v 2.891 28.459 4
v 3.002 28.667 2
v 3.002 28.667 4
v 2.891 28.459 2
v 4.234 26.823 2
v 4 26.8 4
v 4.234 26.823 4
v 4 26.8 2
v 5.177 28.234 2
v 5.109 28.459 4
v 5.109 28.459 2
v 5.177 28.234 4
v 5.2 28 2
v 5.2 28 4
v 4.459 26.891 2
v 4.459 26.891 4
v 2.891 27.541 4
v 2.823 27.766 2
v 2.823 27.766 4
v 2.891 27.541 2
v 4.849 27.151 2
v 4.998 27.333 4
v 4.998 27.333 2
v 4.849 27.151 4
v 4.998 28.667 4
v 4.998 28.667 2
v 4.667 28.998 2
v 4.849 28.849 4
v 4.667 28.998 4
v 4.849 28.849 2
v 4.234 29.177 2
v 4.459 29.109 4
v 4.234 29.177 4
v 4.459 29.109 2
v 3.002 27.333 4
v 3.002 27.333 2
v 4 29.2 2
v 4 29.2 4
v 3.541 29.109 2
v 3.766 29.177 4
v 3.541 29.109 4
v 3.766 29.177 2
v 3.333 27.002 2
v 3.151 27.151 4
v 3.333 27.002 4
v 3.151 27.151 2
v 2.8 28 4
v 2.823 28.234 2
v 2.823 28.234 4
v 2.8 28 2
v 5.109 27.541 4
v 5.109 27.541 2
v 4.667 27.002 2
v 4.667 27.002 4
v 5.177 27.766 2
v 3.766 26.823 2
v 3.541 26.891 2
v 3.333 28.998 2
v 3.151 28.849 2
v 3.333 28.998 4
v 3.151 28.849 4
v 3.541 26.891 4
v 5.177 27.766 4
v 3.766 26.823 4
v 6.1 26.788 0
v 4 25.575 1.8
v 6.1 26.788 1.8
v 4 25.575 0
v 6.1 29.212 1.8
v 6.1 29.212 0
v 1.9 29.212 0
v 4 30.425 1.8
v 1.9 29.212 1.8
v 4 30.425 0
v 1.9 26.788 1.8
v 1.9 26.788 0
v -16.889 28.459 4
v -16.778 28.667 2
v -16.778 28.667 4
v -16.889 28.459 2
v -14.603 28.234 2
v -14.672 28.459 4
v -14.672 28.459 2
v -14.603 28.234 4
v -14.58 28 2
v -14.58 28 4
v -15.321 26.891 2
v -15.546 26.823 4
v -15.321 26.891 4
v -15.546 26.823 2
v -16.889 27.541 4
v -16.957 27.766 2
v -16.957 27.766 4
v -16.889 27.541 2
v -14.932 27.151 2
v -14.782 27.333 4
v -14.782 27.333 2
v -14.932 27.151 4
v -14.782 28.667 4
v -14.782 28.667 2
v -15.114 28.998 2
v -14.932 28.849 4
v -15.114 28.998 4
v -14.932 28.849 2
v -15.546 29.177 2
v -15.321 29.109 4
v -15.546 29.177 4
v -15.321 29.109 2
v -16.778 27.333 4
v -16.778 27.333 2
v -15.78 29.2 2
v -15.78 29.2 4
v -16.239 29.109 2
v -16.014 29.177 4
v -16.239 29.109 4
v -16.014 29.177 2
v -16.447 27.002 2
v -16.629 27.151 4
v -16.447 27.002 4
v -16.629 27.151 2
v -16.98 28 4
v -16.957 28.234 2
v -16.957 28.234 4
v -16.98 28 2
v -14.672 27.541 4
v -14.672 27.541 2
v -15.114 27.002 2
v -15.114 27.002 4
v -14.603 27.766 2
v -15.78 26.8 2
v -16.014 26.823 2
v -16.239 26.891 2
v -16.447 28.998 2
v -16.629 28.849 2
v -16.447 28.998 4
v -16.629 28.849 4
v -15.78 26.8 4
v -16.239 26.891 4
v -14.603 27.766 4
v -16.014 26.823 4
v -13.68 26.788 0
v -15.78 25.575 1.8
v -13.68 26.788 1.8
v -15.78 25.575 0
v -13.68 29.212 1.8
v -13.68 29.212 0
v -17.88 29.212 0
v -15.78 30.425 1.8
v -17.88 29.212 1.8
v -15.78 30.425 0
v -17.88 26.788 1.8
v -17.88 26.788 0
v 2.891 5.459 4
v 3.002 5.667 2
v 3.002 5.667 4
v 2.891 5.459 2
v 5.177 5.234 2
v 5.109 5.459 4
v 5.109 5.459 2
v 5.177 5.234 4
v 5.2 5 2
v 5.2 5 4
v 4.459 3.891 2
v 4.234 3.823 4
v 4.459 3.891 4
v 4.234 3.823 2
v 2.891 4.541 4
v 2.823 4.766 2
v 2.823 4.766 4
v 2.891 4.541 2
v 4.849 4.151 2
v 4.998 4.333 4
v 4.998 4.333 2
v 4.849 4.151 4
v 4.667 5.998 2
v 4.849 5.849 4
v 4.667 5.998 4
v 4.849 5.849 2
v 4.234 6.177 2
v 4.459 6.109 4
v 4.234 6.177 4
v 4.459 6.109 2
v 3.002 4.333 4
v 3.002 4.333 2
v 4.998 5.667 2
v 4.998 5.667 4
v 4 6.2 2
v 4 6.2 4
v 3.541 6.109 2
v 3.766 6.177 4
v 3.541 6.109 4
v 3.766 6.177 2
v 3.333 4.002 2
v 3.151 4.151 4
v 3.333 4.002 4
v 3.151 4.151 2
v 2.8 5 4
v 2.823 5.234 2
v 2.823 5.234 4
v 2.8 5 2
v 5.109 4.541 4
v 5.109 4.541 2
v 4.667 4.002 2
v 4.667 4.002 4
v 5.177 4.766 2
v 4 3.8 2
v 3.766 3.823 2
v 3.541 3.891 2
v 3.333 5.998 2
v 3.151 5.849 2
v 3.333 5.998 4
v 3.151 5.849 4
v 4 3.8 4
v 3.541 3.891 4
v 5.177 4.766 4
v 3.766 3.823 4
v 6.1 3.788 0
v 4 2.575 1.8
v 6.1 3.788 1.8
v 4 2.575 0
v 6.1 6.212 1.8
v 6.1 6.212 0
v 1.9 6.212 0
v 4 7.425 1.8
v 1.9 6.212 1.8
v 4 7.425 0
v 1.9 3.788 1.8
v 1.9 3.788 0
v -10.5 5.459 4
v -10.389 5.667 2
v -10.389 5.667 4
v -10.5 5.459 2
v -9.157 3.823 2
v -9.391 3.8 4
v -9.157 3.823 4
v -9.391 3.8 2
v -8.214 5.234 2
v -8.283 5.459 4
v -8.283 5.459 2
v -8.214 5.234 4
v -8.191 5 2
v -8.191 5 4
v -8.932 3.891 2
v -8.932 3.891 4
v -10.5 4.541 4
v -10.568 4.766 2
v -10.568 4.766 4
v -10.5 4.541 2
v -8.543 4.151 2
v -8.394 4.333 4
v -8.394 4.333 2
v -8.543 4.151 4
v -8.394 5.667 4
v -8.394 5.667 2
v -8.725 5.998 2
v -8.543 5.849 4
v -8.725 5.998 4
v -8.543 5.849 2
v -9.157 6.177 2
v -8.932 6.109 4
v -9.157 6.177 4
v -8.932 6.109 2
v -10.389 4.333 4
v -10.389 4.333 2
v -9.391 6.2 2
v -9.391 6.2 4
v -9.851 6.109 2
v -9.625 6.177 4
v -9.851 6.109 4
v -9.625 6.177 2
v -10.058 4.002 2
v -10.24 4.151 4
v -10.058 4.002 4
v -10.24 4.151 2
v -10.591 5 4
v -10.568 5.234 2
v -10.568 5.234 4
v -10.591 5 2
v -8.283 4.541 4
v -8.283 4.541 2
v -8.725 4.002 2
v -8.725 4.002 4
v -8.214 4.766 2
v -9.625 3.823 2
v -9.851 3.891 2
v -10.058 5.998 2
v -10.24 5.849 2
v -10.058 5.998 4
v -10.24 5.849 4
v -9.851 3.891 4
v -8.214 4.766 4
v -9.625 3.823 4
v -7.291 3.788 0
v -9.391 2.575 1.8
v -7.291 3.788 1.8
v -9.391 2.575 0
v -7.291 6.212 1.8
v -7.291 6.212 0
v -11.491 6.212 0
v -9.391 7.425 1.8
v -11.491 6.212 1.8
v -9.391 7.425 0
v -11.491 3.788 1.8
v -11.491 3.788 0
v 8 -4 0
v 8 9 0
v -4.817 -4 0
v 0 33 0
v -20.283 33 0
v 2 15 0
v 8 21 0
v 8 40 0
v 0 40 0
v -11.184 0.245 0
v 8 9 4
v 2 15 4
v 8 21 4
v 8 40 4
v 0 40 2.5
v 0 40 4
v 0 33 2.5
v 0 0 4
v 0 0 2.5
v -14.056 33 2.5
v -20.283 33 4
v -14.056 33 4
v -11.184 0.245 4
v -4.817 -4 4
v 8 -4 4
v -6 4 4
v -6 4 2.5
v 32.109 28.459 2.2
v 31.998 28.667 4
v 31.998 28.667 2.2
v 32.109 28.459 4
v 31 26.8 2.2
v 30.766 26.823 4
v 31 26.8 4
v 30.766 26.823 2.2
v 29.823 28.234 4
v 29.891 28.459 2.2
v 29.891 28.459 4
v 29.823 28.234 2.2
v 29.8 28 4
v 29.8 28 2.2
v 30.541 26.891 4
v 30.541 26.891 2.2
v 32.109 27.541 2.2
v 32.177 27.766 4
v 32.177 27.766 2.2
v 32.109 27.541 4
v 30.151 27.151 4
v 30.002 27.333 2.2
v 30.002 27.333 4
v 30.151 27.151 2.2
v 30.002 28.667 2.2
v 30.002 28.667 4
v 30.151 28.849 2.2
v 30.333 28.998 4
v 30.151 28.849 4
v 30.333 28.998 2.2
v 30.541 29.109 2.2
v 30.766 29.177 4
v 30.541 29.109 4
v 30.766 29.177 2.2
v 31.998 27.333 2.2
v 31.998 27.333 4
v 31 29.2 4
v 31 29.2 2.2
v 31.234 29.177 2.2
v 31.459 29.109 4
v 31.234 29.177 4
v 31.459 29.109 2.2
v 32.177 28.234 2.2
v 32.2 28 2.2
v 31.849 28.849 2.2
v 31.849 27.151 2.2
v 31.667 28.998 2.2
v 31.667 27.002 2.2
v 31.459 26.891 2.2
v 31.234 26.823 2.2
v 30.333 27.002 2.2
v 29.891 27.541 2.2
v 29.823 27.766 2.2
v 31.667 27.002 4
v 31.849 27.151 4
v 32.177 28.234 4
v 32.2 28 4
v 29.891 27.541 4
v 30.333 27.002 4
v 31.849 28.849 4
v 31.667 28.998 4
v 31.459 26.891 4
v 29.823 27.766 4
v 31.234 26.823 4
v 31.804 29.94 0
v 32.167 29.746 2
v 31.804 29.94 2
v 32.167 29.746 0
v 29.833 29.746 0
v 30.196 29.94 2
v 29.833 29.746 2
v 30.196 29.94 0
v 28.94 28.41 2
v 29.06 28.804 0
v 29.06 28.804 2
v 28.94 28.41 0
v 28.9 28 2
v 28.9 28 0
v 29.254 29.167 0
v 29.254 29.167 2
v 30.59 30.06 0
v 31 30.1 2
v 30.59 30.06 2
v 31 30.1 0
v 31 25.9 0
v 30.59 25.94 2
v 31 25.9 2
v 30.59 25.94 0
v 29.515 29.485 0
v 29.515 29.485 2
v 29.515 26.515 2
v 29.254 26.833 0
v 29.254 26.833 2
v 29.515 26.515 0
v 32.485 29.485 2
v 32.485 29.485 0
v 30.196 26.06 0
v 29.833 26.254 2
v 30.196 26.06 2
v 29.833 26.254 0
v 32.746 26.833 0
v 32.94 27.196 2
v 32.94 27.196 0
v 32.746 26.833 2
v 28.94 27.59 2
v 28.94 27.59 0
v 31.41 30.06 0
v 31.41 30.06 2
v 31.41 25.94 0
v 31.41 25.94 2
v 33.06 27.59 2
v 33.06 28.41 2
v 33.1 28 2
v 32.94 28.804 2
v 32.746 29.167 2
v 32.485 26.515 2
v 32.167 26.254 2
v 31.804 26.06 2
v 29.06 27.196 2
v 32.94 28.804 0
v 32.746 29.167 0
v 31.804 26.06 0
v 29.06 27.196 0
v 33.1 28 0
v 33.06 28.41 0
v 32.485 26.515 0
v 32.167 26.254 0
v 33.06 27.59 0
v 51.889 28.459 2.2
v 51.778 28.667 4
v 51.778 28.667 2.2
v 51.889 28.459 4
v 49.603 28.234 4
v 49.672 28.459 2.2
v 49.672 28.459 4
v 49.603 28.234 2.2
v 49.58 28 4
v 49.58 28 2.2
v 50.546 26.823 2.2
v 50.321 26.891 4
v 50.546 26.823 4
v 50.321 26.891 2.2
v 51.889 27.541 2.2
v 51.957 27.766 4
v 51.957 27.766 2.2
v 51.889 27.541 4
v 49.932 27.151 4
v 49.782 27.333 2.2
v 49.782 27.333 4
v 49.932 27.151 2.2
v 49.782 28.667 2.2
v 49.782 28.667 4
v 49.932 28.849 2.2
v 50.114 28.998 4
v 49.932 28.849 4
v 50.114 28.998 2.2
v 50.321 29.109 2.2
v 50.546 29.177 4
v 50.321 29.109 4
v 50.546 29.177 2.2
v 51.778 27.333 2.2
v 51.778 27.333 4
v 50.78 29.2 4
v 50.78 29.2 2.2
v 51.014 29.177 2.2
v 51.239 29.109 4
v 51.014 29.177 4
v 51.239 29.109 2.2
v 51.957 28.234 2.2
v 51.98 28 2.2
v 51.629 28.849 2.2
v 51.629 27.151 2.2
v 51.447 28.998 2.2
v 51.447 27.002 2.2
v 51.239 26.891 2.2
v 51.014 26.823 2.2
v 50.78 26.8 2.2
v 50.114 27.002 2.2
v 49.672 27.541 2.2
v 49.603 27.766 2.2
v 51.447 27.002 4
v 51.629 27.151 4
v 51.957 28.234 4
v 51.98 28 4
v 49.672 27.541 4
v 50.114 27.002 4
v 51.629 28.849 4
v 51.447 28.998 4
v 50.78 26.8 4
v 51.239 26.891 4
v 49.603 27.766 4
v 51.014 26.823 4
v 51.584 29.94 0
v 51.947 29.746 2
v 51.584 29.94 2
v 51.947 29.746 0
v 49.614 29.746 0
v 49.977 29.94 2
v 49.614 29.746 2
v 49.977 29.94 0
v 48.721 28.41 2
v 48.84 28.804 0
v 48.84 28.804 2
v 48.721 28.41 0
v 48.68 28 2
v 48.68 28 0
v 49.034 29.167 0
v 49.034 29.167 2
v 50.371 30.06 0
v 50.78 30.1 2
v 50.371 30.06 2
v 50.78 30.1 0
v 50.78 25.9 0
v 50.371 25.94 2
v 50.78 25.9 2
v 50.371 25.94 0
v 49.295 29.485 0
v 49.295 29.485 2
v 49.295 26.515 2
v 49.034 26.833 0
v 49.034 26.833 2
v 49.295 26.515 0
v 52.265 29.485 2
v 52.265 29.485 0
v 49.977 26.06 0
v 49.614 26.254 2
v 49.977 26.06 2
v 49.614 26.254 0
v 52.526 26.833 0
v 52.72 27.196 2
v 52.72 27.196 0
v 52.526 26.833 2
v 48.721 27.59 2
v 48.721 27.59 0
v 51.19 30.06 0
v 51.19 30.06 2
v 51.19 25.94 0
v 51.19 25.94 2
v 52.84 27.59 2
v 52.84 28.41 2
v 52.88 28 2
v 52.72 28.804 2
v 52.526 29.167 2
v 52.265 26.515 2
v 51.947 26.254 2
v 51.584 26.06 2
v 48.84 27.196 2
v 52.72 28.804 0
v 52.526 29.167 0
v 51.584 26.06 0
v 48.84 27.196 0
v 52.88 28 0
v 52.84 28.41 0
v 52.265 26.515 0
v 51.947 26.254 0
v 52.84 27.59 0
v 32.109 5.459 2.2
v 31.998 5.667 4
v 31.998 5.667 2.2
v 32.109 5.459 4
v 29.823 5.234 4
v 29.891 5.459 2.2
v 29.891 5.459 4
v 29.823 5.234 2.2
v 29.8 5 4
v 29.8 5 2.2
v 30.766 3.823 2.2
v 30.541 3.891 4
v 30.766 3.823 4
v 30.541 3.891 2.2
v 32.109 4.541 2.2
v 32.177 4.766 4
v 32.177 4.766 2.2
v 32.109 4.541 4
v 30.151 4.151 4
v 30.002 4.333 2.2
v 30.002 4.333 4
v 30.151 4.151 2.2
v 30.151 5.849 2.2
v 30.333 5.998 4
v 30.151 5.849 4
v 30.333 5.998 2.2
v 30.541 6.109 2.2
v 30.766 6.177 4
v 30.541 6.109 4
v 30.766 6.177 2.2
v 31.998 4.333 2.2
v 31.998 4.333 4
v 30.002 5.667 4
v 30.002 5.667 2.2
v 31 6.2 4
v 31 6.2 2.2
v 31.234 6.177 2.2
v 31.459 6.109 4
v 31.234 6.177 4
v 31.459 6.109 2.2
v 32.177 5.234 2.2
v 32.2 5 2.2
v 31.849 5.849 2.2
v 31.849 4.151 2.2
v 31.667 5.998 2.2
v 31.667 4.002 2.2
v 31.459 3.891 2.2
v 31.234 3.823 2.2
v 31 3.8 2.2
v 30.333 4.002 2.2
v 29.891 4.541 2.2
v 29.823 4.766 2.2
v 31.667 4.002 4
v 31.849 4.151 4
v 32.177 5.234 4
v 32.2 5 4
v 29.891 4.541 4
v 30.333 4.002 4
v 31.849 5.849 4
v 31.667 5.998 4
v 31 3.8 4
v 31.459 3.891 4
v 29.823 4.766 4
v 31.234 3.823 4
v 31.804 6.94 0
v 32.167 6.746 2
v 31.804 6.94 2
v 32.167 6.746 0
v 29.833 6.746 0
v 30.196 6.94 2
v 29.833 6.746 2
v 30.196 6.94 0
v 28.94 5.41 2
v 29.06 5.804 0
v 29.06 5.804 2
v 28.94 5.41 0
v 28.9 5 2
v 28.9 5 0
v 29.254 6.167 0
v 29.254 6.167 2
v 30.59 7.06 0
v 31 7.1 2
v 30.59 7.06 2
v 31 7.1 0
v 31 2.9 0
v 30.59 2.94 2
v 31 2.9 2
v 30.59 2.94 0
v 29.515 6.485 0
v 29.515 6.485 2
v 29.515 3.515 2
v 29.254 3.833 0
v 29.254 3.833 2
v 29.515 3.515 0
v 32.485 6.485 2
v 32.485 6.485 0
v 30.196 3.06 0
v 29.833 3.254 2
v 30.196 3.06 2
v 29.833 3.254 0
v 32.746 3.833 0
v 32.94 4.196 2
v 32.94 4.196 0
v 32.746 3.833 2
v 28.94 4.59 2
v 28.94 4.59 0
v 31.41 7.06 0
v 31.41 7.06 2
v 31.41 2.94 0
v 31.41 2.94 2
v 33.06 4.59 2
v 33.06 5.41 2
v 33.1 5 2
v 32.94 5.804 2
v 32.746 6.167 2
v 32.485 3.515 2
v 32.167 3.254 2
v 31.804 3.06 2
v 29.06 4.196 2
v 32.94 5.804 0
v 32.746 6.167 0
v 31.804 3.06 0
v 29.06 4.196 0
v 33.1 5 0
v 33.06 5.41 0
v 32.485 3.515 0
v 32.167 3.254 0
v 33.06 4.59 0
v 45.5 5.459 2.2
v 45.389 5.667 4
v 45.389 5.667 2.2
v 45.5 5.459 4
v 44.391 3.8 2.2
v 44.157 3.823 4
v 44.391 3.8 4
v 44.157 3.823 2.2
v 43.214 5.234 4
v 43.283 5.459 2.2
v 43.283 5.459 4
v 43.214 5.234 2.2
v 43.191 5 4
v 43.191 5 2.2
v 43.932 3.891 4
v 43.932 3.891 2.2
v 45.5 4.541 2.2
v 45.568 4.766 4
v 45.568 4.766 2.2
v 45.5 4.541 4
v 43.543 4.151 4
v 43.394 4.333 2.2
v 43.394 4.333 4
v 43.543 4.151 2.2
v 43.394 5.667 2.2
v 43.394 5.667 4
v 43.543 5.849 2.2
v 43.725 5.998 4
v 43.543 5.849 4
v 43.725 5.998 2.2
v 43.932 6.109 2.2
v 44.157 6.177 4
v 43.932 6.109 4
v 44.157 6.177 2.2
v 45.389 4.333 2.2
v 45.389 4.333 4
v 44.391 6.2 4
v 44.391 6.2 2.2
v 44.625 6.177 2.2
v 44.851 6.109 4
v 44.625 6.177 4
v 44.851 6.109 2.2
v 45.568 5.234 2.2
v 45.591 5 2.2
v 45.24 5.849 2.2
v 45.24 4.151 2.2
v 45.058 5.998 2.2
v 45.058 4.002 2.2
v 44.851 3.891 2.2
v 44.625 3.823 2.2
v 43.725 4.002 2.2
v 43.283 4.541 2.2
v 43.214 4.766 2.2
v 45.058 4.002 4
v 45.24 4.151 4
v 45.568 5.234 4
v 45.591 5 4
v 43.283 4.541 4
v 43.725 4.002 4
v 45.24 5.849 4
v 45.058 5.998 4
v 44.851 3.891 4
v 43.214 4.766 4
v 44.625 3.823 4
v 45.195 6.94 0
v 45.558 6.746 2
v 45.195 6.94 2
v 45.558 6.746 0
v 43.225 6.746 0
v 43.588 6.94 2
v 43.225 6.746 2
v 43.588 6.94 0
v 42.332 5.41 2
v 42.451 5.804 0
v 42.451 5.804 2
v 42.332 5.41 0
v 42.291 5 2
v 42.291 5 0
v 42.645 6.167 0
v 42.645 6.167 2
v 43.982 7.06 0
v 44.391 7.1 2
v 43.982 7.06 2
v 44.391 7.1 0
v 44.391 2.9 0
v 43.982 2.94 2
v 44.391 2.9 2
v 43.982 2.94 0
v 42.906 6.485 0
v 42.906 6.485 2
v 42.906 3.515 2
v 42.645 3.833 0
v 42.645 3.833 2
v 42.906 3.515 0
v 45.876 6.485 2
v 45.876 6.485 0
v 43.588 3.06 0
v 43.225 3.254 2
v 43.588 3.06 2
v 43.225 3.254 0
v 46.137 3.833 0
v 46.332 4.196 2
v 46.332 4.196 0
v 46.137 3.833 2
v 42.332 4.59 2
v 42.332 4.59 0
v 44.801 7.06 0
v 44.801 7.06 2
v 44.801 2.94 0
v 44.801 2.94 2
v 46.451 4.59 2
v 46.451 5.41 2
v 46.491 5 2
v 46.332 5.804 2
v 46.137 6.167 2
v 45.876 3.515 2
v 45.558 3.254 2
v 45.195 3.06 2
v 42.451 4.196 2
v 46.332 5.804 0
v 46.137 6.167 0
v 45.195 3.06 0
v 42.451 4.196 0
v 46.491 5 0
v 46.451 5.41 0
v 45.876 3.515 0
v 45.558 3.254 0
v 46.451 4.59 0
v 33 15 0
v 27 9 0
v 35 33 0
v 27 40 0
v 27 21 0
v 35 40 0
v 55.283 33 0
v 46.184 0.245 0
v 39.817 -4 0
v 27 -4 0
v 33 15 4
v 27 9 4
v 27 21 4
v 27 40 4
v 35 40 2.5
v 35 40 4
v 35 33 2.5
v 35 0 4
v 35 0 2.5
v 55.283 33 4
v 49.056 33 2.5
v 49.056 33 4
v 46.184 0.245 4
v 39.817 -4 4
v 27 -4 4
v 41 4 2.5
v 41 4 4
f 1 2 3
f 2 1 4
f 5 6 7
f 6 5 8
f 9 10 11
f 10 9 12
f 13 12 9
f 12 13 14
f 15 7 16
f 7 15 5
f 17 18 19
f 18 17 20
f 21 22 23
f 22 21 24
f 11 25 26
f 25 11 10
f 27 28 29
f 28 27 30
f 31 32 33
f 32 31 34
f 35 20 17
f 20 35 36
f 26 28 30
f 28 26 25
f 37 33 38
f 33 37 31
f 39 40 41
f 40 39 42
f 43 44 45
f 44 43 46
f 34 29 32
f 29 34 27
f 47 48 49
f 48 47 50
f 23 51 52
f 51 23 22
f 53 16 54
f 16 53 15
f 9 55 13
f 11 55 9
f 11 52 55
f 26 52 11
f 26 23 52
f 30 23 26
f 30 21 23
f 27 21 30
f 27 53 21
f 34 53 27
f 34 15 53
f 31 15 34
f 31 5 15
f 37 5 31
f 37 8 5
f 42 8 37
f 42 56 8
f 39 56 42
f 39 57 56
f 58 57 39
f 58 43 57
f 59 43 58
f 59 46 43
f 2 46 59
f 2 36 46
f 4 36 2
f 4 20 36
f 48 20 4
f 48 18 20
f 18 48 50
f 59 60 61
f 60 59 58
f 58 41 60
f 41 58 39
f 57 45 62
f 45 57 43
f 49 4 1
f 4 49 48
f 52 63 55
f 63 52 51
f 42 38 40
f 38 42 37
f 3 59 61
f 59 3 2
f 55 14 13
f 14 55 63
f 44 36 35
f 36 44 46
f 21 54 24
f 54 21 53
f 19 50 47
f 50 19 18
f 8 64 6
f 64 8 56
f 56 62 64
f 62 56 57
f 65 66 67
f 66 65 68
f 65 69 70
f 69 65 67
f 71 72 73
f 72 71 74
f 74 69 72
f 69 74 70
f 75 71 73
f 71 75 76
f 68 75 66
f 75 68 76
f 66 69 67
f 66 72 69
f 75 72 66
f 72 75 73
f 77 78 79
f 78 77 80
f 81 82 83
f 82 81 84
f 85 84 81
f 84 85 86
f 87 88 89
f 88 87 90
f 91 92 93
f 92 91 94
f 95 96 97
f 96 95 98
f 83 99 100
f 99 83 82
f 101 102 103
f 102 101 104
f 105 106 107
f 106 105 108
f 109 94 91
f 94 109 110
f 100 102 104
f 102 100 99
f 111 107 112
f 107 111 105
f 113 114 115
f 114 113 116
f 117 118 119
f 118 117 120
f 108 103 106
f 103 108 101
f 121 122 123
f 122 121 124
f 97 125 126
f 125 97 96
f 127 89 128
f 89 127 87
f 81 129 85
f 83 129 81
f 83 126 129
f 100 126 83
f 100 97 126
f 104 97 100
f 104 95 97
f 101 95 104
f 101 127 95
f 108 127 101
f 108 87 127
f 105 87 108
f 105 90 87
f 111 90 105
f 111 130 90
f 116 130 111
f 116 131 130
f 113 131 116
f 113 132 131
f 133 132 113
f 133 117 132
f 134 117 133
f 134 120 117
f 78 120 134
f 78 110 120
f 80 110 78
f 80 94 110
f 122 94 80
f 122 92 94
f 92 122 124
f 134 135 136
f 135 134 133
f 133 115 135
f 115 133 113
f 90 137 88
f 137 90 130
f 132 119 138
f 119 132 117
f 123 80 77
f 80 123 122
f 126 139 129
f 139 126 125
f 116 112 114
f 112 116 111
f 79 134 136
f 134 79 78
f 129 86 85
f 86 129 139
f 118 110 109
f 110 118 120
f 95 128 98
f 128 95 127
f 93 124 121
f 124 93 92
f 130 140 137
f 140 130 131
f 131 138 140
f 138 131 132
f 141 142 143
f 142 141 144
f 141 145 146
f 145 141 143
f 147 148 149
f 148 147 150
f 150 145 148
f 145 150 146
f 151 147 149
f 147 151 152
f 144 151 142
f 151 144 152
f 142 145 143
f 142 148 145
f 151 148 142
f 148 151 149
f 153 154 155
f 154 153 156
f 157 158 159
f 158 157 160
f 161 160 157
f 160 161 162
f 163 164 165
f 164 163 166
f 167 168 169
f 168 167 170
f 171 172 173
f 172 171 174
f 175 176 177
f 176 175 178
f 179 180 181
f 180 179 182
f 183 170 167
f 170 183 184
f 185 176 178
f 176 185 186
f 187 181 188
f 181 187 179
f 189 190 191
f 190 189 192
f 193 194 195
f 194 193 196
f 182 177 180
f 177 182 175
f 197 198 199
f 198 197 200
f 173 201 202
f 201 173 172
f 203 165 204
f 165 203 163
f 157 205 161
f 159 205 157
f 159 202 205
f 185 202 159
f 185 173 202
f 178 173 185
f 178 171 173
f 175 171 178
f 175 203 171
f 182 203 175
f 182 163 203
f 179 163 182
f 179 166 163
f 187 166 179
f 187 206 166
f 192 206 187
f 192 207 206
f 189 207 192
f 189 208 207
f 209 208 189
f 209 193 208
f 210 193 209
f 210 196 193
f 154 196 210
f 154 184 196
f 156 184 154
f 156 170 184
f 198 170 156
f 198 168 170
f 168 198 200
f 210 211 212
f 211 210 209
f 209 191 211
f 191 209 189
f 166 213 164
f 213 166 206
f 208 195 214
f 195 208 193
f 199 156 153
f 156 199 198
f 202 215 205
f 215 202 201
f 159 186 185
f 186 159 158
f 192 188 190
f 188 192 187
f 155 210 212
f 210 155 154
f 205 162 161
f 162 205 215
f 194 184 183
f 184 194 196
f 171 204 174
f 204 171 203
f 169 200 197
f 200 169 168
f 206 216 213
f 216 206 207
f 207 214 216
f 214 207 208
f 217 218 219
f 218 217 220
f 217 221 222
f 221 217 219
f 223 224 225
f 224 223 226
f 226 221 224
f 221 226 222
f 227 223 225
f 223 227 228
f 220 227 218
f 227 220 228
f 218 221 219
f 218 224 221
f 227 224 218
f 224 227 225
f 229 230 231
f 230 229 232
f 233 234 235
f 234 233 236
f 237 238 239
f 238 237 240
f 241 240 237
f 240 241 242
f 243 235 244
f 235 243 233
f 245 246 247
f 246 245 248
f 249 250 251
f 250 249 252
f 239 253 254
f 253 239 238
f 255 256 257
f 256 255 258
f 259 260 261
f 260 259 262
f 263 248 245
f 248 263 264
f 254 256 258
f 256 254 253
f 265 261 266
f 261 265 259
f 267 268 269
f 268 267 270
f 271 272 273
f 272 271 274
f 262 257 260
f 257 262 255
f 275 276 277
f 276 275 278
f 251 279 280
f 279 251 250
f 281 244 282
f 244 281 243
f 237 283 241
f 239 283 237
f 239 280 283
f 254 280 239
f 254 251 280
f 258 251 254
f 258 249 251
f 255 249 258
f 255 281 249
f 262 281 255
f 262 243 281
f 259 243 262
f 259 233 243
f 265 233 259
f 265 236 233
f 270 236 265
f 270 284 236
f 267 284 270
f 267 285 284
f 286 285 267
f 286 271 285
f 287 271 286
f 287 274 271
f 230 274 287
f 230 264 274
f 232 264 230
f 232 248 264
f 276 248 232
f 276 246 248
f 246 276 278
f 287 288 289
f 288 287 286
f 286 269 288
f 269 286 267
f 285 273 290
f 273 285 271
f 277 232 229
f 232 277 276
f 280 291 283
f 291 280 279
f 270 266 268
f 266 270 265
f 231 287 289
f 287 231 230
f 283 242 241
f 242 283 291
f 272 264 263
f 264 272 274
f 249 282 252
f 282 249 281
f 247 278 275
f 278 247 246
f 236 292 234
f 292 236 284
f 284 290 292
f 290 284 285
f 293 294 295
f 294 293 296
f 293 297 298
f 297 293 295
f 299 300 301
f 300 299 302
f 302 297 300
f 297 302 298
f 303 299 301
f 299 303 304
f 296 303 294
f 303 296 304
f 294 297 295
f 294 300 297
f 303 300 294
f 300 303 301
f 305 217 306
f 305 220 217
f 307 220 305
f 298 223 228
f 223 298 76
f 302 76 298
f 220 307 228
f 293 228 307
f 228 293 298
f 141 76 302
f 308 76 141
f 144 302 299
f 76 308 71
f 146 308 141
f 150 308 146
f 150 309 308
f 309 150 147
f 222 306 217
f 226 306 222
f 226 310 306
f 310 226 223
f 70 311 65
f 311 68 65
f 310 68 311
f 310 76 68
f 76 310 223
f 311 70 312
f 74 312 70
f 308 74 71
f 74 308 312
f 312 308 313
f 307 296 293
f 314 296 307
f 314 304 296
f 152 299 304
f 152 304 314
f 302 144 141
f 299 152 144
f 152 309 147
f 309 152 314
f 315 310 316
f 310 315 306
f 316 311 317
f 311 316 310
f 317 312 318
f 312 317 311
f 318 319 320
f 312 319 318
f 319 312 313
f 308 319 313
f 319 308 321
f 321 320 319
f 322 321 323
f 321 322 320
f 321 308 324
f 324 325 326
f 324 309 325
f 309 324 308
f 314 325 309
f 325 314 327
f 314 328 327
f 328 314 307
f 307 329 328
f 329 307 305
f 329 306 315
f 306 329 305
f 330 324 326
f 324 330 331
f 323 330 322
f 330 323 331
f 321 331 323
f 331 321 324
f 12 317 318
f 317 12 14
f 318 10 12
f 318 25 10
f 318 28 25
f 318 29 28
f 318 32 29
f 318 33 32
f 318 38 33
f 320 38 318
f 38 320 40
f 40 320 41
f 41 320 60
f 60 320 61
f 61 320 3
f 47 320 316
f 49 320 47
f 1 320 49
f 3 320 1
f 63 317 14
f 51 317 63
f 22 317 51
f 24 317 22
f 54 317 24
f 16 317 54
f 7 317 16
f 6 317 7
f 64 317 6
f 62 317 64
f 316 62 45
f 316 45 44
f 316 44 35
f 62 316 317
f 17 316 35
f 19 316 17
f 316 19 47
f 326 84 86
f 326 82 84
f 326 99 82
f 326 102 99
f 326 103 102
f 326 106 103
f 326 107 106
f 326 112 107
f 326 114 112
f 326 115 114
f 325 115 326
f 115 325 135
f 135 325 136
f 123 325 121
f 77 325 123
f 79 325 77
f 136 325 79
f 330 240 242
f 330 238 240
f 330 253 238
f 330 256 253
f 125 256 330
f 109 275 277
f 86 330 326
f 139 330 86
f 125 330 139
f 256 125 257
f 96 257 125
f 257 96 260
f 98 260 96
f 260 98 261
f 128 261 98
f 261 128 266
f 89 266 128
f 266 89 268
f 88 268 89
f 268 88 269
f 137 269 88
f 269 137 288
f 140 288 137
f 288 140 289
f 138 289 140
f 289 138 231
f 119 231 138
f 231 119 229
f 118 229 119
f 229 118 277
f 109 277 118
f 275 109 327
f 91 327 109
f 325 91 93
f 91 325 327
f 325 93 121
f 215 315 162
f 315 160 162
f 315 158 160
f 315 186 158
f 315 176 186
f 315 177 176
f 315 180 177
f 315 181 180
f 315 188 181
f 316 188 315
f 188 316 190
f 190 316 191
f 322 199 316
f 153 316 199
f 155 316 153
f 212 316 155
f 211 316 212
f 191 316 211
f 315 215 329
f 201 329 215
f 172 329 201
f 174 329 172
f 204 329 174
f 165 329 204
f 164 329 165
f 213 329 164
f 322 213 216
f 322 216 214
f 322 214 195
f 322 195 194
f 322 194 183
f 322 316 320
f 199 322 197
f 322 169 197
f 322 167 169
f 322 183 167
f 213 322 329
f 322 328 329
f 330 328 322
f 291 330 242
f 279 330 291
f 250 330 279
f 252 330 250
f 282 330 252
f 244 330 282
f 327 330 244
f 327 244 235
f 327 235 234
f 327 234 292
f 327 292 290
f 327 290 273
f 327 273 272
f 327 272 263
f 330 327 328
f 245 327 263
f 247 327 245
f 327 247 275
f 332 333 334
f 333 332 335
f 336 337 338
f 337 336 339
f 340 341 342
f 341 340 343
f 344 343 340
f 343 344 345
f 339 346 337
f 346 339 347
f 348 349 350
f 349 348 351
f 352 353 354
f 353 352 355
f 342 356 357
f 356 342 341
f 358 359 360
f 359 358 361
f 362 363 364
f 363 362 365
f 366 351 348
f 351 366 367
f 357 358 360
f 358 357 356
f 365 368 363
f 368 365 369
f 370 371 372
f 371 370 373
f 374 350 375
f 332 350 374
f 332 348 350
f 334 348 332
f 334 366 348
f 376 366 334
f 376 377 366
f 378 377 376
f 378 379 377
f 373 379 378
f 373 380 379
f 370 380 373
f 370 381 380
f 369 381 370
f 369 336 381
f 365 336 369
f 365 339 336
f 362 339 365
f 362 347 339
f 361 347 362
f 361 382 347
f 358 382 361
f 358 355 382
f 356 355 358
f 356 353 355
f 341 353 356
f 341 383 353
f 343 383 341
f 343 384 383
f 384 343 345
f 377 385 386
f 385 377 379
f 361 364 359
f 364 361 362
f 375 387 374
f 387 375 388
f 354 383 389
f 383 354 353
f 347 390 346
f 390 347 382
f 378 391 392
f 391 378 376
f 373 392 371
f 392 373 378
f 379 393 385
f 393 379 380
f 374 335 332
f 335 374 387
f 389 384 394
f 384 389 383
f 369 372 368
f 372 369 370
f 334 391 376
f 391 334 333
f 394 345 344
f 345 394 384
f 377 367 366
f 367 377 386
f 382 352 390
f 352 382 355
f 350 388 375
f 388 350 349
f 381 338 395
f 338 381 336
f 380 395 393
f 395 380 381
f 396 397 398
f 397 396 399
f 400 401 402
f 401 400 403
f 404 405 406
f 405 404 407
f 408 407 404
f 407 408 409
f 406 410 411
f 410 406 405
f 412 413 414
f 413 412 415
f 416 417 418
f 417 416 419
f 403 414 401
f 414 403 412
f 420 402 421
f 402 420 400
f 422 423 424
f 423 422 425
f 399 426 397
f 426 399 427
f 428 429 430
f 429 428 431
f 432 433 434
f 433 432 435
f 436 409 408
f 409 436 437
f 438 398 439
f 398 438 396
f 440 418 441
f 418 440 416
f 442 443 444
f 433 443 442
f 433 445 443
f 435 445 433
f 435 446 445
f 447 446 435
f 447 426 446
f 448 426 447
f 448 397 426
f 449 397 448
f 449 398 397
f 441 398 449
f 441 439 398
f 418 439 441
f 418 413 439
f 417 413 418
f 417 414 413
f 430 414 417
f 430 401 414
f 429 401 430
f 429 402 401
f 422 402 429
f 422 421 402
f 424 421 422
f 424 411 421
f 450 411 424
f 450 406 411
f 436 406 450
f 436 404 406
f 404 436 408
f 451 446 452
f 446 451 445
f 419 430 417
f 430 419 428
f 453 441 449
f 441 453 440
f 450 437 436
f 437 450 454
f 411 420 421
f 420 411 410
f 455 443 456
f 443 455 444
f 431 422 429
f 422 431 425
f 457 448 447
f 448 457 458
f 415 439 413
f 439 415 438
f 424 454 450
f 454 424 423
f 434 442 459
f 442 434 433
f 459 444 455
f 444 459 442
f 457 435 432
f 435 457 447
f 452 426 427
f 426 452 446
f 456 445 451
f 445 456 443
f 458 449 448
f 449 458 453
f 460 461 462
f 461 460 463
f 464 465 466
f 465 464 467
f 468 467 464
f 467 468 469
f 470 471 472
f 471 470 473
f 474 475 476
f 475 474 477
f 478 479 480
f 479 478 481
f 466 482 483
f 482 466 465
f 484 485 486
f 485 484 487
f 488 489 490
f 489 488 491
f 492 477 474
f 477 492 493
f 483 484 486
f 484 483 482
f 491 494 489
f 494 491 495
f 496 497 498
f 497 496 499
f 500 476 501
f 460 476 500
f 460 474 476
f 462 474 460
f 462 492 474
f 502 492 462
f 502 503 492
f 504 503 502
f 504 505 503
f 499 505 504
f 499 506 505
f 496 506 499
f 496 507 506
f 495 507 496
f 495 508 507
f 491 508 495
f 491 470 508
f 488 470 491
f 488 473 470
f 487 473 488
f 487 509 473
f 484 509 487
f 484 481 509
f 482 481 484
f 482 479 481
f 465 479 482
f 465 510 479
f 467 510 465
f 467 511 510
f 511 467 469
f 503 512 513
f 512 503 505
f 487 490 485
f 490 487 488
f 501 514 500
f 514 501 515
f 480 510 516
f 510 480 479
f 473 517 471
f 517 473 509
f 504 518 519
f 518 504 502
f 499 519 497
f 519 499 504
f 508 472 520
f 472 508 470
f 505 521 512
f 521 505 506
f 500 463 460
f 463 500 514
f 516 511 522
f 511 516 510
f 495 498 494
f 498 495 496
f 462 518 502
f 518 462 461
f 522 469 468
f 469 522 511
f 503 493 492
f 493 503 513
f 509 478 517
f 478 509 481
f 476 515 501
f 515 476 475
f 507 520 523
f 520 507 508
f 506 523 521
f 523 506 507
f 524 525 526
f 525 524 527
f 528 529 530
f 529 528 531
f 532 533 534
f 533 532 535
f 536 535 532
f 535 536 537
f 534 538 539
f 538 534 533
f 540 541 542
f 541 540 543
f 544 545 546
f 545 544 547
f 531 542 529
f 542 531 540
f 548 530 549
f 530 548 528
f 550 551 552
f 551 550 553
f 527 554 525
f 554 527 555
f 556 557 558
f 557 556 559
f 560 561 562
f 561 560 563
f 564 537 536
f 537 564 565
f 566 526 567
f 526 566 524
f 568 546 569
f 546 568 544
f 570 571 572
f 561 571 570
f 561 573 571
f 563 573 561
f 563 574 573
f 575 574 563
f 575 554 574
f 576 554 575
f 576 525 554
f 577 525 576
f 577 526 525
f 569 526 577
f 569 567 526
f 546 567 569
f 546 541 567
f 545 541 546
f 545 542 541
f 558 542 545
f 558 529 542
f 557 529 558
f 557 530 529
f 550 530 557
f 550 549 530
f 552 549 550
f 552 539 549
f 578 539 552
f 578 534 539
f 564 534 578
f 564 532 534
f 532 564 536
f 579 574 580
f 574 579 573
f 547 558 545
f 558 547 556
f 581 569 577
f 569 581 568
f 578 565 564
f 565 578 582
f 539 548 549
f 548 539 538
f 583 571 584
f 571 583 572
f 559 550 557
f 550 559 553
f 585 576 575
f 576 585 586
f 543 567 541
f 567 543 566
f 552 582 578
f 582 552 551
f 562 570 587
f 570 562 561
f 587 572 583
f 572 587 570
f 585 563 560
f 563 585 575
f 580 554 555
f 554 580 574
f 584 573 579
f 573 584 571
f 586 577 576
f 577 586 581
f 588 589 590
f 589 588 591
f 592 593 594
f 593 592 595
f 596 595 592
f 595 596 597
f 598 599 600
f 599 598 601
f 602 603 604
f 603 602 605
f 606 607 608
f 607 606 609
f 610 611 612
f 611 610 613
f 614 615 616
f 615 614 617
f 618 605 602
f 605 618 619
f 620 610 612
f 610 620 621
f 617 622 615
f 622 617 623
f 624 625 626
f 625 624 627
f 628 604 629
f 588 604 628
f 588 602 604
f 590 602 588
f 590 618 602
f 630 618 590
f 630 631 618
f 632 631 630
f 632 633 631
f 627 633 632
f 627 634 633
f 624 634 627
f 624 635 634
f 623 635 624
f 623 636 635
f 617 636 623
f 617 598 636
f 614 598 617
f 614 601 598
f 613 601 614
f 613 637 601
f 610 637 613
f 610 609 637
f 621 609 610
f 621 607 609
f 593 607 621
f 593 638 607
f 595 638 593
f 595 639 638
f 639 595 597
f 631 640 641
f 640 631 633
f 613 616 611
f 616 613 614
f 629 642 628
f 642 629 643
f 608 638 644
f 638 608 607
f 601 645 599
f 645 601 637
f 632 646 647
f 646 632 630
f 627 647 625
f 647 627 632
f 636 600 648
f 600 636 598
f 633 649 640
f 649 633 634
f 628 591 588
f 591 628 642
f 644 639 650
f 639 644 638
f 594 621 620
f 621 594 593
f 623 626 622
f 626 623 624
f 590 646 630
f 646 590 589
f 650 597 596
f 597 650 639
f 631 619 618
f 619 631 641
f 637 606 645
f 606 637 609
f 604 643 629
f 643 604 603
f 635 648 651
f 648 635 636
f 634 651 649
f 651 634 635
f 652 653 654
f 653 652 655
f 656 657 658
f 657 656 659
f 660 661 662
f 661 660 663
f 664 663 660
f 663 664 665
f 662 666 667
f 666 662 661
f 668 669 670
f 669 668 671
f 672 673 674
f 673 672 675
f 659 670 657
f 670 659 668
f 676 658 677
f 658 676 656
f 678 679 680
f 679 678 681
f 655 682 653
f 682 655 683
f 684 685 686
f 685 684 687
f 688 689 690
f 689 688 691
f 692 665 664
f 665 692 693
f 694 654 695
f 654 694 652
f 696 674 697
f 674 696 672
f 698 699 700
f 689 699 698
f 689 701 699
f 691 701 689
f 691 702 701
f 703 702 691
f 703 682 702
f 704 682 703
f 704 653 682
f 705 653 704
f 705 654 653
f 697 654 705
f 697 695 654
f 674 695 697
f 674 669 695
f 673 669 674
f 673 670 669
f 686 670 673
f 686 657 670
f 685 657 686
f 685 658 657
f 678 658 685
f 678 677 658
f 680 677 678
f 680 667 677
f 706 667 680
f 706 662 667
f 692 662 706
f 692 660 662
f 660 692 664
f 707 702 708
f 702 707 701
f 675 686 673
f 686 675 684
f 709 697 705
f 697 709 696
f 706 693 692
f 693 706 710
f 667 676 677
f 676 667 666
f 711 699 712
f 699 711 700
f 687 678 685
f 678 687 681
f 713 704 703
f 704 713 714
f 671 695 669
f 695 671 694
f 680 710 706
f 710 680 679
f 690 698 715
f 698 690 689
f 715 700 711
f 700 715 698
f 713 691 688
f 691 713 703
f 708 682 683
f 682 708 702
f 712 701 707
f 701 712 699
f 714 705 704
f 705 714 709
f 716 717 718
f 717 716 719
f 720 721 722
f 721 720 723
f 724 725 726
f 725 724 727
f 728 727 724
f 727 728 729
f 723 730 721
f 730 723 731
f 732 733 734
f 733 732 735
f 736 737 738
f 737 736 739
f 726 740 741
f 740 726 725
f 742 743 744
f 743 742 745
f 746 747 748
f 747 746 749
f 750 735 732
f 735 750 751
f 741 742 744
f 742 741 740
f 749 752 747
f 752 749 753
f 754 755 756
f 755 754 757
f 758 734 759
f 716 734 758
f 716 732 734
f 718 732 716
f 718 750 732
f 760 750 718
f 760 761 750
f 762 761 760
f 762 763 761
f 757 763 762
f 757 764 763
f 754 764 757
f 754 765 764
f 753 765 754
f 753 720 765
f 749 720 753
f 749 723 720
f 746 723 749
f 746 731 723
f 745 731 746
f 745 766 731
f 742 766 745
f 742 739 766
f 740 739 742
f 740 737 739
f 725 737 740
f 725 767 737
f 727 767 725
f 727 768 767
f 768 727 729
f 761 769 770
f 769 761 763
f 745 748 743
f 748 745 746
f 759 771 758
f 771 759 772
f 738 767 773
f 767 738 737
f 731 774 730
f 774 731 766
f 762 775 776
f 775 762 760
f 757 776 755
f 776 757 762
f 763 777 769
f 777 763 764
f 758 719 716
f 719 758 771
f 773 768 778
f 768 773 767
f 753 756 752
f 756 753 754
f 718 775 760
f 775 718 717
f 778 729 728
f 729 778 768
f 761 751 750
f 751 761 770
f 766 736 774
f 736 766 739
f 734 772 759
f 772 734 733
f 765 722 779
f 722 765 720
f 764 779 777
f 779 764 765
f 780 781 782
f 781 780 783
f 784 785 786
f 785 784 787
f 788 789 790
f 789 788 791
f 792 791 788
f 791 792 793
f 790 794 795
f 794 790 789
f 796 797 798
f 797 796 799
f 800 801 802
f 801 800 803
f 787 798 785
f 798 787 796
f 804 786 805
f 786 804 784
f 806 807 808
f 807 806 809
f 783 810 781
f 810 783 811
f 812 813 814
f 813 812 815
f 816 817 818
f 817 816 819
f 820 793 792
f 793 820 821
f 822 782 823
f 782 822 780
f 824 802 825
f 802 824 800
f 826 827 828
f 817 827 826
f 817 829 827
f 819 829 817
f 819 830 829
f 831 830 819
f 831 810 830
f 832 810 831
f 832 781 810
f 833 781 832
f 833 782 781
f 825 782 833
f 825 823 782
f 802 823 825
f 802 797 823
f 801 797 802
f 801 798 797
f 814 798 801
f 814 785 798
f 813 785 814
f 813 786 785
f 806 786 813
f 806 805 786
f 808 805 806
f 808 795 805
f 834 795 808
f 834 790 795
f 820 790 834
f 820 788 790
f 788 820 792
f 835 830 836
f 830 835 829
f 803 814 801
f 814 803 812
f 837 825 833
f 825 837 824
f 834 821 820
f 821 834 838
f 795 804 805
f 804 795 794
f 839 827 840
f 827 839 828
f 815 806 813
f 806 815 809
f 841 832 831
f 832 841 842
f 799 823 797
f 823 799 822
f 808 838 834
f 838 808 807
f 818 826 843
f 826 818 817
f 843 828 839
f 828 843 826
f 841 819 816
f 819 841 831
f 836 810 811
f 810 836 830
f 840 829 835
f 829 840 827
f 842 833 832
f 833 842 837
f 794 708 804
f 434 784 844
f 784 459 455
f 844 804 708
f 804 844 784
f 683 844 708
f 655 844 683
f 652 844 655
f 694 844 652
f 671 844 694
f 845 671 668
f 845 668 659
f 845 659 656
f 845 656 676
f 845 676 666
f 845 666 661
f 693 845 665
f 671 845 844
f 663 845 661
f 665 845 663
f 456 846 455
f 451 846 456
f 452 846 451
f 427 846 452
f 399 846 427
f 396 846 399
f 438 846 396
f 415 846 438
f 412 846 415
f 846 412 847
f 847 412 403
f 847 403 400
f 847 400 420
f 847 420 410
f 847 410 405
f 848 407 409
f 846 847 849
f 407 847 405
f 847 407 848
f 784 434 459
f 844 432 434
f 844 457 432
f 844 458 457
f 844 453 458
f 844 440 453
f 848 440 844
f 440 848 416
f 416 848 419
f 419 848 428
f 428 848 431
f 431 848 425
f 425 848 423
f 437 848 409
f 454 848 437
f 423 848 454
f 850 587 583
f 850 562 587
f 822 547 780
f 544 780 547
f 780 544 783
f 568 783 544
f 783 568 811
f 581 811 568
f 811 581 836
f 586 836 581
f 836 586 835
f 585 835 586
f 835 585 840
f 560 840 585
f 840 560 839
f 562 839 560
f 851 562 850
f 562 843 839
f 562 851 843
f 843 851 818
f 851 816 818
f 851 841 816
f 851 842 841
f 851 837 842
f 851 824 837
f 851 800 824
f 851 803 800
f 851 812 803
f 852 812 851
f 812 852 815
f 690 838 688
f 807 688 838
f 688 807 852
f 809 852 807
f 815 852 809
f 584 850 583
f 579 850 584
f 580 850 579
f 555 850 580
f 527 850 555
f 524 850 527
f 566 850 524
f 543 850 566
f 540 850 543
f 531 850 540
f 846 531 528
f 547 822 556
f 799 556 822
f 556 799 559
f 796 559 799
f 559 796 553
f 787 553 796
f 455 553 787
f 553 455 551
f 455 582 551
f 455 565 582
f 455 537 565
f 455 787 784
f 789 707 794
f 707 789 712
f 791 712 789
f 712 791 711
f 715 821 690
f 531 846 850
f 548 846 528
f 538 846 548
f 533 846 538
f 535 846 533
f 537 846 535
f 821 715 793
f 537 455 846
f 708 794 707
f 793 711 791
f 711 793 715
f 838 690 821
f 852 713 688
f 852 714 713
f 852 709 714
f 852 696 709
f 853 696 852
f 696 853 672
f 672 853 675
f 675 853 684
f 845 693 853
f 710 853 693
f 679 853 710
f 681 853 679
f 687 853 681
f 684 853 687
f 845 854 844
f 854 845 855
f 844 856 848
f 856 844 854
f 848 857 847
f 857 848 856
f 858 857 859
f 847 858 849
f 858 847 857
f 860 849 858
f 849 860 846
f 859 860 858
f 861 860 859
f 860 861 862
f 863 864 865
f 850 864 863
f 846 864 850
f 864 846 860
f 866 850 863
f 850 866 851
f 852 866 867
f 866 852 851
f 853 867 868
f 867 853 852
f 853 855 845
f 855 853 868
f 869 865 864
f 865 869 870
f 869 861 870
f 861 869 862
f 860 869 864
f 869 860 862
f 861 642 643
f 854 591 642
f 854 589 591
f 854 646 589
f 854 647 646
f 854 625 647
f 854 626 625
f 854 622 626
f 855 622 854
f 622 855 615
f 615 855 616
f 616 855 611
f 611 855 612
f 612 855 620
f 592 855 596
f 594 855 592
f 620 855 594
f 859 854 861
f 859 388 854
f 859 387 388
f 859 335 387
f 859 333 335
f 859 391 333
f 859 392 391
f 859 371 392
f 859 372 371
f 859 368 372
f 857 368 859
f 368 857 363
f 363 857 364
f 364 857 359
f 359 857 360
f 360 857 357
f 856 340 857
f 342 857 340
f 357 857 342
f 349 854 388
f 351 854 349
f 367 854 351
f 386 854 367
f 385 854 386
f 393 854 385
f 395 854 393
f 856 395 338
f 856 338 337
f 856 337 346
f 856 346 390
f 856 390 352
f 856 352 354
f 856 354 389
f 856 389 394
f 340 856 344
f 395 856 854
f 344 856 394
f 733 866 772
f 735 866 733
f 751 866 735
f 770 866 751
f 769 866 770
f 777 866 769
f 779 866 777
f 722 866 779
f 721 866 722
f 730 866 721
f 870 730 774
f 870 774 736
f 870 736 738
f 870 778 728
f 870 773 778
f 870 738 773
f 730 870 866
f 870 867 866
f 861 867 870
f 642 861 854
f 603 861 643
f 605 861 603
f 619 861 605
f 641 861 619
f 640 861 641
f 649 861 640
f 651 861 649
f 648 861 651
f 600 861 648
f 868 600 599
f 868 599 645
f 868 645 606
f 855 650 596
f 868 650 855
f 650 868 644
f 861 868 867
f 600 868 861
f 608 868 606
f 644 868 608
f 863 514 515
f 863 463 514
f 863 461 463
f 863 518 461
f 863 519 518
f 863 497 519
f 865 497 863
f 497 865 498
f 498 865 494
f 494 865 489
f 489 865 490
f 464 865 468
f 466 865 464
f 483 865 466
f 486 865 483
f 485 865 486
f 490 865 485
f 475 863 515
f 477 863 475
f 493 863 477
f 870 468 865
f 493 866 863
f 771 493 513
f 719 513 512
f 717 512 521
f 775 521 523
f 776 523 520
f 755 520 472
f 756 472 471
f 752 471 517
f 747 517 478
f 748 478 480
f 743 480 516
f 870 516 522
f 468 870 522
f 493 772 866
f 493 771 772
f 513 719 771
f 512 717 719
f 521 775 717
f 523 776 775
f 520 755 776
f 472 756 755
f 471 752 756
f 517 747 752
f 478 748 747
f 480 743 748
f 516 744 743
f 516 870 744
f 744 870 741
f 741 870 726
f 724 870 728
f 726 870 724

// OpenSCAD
/*
 * Parametric OpenSCAD design for a caliper notched jaw cover.
 * Version: v0.07
 * Designed to exactly match the provided sketch:
 * - Straight measuring face with a V-notch
 * - Slanted outer face
 * - Top extension tab for alignment
 * - Slanted bottom tip
 */

/* [Version] */
version = "0.07";

/* [General Settings] */
// Which part to generate, laid flat for 3D printing
part = "split_halves"; // [left_fixed, right_sliding, both, cutaway, split_halves]

/* [Caliper Metal Jaw Dimensions] */
// Total length of the metal jaw to cover (including the tab area)
jaw_length = 40.0;
// Thickness of the metal jaw
jaw_thickness = 3.0;
// Width of the metal jaw at the base (top, where it meets the caliper body)
jaw_base_width = 16.0;
// Width of the metal jaw where the main outer slant begins (X offset at the cutback)
jaw_tip_slant_width = 6.0;
// Distance from the tip (Y=0) where the main outer slant begins (Y offset of the cutback)
jaw_tip_slant_height = 4.0;

/* [Cover Dimensions] */
// Total thickness of the printed cover
cover_total_thickness = 8.0;
// Thickness of the plastic on the measuring (straight) face
wall_measuring_face = 8.0;
// Thickness of the plastic on the outer (slanted) faces (perpendicular thickness)
wall_outer_face = 6.0;
// Thickness of the plastic at the bottom tip
wall_tip = 4.0;

/* [Tab and Cutout Dimensions] */
// Length of the cutout at the top to clear the caliper body (makes the tab)
cutout_length = 7.0;

/* [Notch Dimensions] */
// Distance from the inner metal jaw tip to the center of the V-notch
notch_distance_from_tip = 15.0;
// Total vertical height of the V-notch opening
notch_height = 12.0;
// Depth of the V-notch into the plastic
notch_depth = 6.0;

/* [Bolt Holes] */
// Add optional M2 bolt holes to clamp the cover
enable_bolt_holes = true;
// Y position (height) of the top bolt holes
bolt_hole_top_y = 28.0;
// Y position (height) of the bottom bolt holes
bolt_hole_bottom_y = 5.0;
// Diameter of the M2 bolt shaft clearance hole
m2_hole_dia = 2.4;
// Flat-to-flat width of the M2 nut (4.0mm standard + 0.2mm clearance)
m2_nut_flat_to_flat = 4.2;
// Depth of the M2 nut recession
m2_nut_depth = 1.8;
// Diameter of the M2 bolt head recession
m2_head_dia = 4.2;
// Depth of the M2 bolt head recession
m2_head_depth = 2.0;
// Thickness of the sacrificial bridge layer to support the nut recession overhang (typically 1 layer height)
bridge_layer_thickness = 0.2;

// --- Implementation ---
$fn = 64;

// Calculate Z wall thickness to perfectly center the cavity
wall_z = (cover_total_thickness - jaw_thickness) / 2;

// --- Math for exact perpendicular offsets of the slanted outer walls ---
// Main Slant
m_main = (jaw_tip_slant_width - jaw_base_width) / (jaw_length - jaw_tip_slant_height);
b_main = -jaw_tip_slant_width - m_main * jaw_tip_slant_height;
function outer_main_x(y) = m_main * y + b_main - wall_outer_face * sqrt(1 + m_main*m_main);

// Bottom Cutback Slant
m_cut = -jaw_tip_slant_width / jaw_tip_slant_height;
b_cut = 0;
function outer_cut_x(y) = m_cut * y + b_cut - wall_outer_face * sqrt(1 + m_cut*m_cut);

// Intersection corner of the two perfectly offset outer walls
m_diff = m_main - m_cut;
y_int = abs(m_diff) > 0.0001 ? (b_cut - b_main + wall_outer_face * (sqrt(1 + m_main*m_main) - sqrt(1 + m_cut*m_cut))) / m_diff : jaw_tip_slant_height;
x_int = outer_main_x(y_int);


// Function to calculate the internal metal jaw width at any Y coordinate (linear interpolation along the main slant)
function get_jaw_width(y) = jaw_tip_slant_width + (jaw_base_width - jaw_tip_slant_width) * ((y - jaw_tip_slant_height) / (jaw_length - jaw_tip_slant_height));

// Functions to get exact X coordinates of inner/outer walls at any given Y
function get_inner_x(y) = (y > jaw_tip_slant_height) ? -get_jaw_width(y) : -jaw_tip_slant_width * (y / jaw_tip_slant_height);
function get_outer_x(y) = (y > y_int) ? outer_main_x(y) : outer_cut_x(y);

module jaw_cover_2d_profile() {
    // Outer Shell Polygon
    p_outer = [
        // Bottom right (tip of measuring face)
        [wall_measuring_face, -wall_tip],

        // Notch bottom
        [wall_measuring_face, notch_distance_from_tip - notch_height/2],
        // Notch inner point
        [wall_measuring_face - notch_depth, notch_distance_from_tip],
        // Notch top
        [wall_measuring_face, notch_distance_from_tip + notch_height/2],

        // Top right of tab
        [wall_measuring_face, jaw_length],
        // Top left of tab (aligns with straight edge of cavity)
        [0, jaw_length],
        // Inner corner of cutout
        [0, jaw_length - cutout_length],

        // Top left of main body (calculated to stay perfectly parallel to the cavity at exact perpendicular distance)
        [outer_main_x(jaw_length - cutout_length), jaw_length - cutout_length],
        // Corner where the main slant meets the bottom cutback
        [x_int, y_int],
        // Bottom left (calculated to stay perfectly parallel to the bottom cutback cavity)
        [outer_cut_x(-wall_tip), -wall_tip]
    ];

    polygon(p_outer);
}

module cavity_2d_profile() {
    // Extended slightly in Y at the top for a clean boolean difference
    p_cavity = [
        [0, 0], // Bottom right "Tip"
        [-jaw_tip_slant_width, jaw_tip_slant_height], // Bottom left cutback point
        [-get_jaw_width(jaw_length + 1.0), jaw_length + 1.0], // Top left
        [0, jaw_length + 1.0] // Top right
    ];
    polygon(p_cavity);
}

module m2_bolt_hole(x, y) {
    translate([x, y, 0]) {
        // Main shaft
        // Starts above the nut bridge layer and ends below the bolt head bridge layer
        // This leaves exactly a 1-layer solid bridge at both ends for support-free printing
        translate([0, 0, m2_nut_depth + bridge_layer_thickness])
            cylinder(h = cover_total_thickness - m2_head_depth - m2_nut_depth - 2 * bridge_layer_thickness, d = m2_hole_dia, $fn=32);

        // Nut recession (bottom)
        translate([0, 0, -0.01])
            rotate([0, 0, 30])
                cylinder(h = m2_nut_depth + 0.01, d = m2_nut_flat_to_flat / cos(30), $fn=6);

        // Bolt head recession (top)
        translate([0, 0, cover_total_thickness - m2_head_depth])
            cylinder(h = m2_head_depth + 0.01, d = m2_head_dia, $fn=32);
    }
}

module single_jaw_cover() {
    difference() {
        // Main body extrusion
        linear_extrude(height = cover_total_thickness)
            jaw_cover_2d_profile();

        // Hollow cavity subtraction for the metal jaw
        translate([0, 0, wall_z])
            linear_extrude(height = jaw_thickness)
                cavity_2d_profile();

        // Bolt Holes
        if (enable_bolt_holes) {
            // --- Top Pair ---
            // Right hole (measuring face side)
            m2_bolt_hole(wall_measuring_face / 2, bolt_hole_top_y);
            // Left hole (outer slanted face side)
            m2_bolt_hole((get_inner_x(bolt_hole_top_y) + get_outer_x(bolt_hole_top_y)) / 2, bolt_hole_top_y);

            // --- Bottom Pair ---
            // Right hole (measuring face side)
            m2_bolt_hole(wall_measuring_face / 2, bolt_hole_bottom_y);
            // Left hole (outer slanted face side)
            m2_bolt_hole((get_inner_x(bolt_hole_bottom_y) + get_outer_x(bolt_hole_bottom_y)) / 2, bolt_hole_bottom_y);
        }
    }
}

// --- Render Logic ---
// The base model represents the Left (Fixed) Jaw.
// It is oriented flat on the XY plane for easy FDM 3D printing (bridging the cavity).

if (part == "both") {
    // Left fixed jaw
    translate([-10, 0, 0])
        single_jaw_cover();

    // Right sliding jaw (mirrored to face the left jaw)
    translate([10, 0, 0])
        mirror([1, 0, 0])
            single_jaw_cover();

} else if (part == "left_fixed") {
    single_jaw_cover();

} else if (part == "right_sliding") {
    mirror([1, 0, 0])
        single_jaw_cover();

} else if (part == "cutaway") {
    // Render an inspection view with the top half sliced off and the metal jaw rendered inside
    difference() {
        color("SteelBlue", 0.8)
            single_jaw_cover();

        // Cutaway bounding box bisecting the total thickness
        translate([-50, -50, cover_total_thickness / 2])
            cube([100, 100, 50]);
    }

} else if (part == "split_halves") {
    // Render the jaw split exactly down the middle so the two clam-shell halves can be printed

    // Bottom Half (contains nut recessions)
    intersection() {
        single_jaw_cover();
        translate([-50, -50, 0])
            cube([100, 100, cover_total_thickness / 2]);
    }

    // Top Half (contains bolt head recessions)
    // Flipped 180 degrees so the outer flat face sits perfectly on the build plate
    // and the internal cavity cutout faces UP
    translate([35, 0, 0])
        rotate([0, 180, 0])
        translate([0, 0, -cover_total_thickness])
        intersection() {
            single_jaw_cover();
            translate([-50, -50, cover_total_thickness / 2])
                cube([100, 100, cover_total_thickness / 2]);
        }
}
